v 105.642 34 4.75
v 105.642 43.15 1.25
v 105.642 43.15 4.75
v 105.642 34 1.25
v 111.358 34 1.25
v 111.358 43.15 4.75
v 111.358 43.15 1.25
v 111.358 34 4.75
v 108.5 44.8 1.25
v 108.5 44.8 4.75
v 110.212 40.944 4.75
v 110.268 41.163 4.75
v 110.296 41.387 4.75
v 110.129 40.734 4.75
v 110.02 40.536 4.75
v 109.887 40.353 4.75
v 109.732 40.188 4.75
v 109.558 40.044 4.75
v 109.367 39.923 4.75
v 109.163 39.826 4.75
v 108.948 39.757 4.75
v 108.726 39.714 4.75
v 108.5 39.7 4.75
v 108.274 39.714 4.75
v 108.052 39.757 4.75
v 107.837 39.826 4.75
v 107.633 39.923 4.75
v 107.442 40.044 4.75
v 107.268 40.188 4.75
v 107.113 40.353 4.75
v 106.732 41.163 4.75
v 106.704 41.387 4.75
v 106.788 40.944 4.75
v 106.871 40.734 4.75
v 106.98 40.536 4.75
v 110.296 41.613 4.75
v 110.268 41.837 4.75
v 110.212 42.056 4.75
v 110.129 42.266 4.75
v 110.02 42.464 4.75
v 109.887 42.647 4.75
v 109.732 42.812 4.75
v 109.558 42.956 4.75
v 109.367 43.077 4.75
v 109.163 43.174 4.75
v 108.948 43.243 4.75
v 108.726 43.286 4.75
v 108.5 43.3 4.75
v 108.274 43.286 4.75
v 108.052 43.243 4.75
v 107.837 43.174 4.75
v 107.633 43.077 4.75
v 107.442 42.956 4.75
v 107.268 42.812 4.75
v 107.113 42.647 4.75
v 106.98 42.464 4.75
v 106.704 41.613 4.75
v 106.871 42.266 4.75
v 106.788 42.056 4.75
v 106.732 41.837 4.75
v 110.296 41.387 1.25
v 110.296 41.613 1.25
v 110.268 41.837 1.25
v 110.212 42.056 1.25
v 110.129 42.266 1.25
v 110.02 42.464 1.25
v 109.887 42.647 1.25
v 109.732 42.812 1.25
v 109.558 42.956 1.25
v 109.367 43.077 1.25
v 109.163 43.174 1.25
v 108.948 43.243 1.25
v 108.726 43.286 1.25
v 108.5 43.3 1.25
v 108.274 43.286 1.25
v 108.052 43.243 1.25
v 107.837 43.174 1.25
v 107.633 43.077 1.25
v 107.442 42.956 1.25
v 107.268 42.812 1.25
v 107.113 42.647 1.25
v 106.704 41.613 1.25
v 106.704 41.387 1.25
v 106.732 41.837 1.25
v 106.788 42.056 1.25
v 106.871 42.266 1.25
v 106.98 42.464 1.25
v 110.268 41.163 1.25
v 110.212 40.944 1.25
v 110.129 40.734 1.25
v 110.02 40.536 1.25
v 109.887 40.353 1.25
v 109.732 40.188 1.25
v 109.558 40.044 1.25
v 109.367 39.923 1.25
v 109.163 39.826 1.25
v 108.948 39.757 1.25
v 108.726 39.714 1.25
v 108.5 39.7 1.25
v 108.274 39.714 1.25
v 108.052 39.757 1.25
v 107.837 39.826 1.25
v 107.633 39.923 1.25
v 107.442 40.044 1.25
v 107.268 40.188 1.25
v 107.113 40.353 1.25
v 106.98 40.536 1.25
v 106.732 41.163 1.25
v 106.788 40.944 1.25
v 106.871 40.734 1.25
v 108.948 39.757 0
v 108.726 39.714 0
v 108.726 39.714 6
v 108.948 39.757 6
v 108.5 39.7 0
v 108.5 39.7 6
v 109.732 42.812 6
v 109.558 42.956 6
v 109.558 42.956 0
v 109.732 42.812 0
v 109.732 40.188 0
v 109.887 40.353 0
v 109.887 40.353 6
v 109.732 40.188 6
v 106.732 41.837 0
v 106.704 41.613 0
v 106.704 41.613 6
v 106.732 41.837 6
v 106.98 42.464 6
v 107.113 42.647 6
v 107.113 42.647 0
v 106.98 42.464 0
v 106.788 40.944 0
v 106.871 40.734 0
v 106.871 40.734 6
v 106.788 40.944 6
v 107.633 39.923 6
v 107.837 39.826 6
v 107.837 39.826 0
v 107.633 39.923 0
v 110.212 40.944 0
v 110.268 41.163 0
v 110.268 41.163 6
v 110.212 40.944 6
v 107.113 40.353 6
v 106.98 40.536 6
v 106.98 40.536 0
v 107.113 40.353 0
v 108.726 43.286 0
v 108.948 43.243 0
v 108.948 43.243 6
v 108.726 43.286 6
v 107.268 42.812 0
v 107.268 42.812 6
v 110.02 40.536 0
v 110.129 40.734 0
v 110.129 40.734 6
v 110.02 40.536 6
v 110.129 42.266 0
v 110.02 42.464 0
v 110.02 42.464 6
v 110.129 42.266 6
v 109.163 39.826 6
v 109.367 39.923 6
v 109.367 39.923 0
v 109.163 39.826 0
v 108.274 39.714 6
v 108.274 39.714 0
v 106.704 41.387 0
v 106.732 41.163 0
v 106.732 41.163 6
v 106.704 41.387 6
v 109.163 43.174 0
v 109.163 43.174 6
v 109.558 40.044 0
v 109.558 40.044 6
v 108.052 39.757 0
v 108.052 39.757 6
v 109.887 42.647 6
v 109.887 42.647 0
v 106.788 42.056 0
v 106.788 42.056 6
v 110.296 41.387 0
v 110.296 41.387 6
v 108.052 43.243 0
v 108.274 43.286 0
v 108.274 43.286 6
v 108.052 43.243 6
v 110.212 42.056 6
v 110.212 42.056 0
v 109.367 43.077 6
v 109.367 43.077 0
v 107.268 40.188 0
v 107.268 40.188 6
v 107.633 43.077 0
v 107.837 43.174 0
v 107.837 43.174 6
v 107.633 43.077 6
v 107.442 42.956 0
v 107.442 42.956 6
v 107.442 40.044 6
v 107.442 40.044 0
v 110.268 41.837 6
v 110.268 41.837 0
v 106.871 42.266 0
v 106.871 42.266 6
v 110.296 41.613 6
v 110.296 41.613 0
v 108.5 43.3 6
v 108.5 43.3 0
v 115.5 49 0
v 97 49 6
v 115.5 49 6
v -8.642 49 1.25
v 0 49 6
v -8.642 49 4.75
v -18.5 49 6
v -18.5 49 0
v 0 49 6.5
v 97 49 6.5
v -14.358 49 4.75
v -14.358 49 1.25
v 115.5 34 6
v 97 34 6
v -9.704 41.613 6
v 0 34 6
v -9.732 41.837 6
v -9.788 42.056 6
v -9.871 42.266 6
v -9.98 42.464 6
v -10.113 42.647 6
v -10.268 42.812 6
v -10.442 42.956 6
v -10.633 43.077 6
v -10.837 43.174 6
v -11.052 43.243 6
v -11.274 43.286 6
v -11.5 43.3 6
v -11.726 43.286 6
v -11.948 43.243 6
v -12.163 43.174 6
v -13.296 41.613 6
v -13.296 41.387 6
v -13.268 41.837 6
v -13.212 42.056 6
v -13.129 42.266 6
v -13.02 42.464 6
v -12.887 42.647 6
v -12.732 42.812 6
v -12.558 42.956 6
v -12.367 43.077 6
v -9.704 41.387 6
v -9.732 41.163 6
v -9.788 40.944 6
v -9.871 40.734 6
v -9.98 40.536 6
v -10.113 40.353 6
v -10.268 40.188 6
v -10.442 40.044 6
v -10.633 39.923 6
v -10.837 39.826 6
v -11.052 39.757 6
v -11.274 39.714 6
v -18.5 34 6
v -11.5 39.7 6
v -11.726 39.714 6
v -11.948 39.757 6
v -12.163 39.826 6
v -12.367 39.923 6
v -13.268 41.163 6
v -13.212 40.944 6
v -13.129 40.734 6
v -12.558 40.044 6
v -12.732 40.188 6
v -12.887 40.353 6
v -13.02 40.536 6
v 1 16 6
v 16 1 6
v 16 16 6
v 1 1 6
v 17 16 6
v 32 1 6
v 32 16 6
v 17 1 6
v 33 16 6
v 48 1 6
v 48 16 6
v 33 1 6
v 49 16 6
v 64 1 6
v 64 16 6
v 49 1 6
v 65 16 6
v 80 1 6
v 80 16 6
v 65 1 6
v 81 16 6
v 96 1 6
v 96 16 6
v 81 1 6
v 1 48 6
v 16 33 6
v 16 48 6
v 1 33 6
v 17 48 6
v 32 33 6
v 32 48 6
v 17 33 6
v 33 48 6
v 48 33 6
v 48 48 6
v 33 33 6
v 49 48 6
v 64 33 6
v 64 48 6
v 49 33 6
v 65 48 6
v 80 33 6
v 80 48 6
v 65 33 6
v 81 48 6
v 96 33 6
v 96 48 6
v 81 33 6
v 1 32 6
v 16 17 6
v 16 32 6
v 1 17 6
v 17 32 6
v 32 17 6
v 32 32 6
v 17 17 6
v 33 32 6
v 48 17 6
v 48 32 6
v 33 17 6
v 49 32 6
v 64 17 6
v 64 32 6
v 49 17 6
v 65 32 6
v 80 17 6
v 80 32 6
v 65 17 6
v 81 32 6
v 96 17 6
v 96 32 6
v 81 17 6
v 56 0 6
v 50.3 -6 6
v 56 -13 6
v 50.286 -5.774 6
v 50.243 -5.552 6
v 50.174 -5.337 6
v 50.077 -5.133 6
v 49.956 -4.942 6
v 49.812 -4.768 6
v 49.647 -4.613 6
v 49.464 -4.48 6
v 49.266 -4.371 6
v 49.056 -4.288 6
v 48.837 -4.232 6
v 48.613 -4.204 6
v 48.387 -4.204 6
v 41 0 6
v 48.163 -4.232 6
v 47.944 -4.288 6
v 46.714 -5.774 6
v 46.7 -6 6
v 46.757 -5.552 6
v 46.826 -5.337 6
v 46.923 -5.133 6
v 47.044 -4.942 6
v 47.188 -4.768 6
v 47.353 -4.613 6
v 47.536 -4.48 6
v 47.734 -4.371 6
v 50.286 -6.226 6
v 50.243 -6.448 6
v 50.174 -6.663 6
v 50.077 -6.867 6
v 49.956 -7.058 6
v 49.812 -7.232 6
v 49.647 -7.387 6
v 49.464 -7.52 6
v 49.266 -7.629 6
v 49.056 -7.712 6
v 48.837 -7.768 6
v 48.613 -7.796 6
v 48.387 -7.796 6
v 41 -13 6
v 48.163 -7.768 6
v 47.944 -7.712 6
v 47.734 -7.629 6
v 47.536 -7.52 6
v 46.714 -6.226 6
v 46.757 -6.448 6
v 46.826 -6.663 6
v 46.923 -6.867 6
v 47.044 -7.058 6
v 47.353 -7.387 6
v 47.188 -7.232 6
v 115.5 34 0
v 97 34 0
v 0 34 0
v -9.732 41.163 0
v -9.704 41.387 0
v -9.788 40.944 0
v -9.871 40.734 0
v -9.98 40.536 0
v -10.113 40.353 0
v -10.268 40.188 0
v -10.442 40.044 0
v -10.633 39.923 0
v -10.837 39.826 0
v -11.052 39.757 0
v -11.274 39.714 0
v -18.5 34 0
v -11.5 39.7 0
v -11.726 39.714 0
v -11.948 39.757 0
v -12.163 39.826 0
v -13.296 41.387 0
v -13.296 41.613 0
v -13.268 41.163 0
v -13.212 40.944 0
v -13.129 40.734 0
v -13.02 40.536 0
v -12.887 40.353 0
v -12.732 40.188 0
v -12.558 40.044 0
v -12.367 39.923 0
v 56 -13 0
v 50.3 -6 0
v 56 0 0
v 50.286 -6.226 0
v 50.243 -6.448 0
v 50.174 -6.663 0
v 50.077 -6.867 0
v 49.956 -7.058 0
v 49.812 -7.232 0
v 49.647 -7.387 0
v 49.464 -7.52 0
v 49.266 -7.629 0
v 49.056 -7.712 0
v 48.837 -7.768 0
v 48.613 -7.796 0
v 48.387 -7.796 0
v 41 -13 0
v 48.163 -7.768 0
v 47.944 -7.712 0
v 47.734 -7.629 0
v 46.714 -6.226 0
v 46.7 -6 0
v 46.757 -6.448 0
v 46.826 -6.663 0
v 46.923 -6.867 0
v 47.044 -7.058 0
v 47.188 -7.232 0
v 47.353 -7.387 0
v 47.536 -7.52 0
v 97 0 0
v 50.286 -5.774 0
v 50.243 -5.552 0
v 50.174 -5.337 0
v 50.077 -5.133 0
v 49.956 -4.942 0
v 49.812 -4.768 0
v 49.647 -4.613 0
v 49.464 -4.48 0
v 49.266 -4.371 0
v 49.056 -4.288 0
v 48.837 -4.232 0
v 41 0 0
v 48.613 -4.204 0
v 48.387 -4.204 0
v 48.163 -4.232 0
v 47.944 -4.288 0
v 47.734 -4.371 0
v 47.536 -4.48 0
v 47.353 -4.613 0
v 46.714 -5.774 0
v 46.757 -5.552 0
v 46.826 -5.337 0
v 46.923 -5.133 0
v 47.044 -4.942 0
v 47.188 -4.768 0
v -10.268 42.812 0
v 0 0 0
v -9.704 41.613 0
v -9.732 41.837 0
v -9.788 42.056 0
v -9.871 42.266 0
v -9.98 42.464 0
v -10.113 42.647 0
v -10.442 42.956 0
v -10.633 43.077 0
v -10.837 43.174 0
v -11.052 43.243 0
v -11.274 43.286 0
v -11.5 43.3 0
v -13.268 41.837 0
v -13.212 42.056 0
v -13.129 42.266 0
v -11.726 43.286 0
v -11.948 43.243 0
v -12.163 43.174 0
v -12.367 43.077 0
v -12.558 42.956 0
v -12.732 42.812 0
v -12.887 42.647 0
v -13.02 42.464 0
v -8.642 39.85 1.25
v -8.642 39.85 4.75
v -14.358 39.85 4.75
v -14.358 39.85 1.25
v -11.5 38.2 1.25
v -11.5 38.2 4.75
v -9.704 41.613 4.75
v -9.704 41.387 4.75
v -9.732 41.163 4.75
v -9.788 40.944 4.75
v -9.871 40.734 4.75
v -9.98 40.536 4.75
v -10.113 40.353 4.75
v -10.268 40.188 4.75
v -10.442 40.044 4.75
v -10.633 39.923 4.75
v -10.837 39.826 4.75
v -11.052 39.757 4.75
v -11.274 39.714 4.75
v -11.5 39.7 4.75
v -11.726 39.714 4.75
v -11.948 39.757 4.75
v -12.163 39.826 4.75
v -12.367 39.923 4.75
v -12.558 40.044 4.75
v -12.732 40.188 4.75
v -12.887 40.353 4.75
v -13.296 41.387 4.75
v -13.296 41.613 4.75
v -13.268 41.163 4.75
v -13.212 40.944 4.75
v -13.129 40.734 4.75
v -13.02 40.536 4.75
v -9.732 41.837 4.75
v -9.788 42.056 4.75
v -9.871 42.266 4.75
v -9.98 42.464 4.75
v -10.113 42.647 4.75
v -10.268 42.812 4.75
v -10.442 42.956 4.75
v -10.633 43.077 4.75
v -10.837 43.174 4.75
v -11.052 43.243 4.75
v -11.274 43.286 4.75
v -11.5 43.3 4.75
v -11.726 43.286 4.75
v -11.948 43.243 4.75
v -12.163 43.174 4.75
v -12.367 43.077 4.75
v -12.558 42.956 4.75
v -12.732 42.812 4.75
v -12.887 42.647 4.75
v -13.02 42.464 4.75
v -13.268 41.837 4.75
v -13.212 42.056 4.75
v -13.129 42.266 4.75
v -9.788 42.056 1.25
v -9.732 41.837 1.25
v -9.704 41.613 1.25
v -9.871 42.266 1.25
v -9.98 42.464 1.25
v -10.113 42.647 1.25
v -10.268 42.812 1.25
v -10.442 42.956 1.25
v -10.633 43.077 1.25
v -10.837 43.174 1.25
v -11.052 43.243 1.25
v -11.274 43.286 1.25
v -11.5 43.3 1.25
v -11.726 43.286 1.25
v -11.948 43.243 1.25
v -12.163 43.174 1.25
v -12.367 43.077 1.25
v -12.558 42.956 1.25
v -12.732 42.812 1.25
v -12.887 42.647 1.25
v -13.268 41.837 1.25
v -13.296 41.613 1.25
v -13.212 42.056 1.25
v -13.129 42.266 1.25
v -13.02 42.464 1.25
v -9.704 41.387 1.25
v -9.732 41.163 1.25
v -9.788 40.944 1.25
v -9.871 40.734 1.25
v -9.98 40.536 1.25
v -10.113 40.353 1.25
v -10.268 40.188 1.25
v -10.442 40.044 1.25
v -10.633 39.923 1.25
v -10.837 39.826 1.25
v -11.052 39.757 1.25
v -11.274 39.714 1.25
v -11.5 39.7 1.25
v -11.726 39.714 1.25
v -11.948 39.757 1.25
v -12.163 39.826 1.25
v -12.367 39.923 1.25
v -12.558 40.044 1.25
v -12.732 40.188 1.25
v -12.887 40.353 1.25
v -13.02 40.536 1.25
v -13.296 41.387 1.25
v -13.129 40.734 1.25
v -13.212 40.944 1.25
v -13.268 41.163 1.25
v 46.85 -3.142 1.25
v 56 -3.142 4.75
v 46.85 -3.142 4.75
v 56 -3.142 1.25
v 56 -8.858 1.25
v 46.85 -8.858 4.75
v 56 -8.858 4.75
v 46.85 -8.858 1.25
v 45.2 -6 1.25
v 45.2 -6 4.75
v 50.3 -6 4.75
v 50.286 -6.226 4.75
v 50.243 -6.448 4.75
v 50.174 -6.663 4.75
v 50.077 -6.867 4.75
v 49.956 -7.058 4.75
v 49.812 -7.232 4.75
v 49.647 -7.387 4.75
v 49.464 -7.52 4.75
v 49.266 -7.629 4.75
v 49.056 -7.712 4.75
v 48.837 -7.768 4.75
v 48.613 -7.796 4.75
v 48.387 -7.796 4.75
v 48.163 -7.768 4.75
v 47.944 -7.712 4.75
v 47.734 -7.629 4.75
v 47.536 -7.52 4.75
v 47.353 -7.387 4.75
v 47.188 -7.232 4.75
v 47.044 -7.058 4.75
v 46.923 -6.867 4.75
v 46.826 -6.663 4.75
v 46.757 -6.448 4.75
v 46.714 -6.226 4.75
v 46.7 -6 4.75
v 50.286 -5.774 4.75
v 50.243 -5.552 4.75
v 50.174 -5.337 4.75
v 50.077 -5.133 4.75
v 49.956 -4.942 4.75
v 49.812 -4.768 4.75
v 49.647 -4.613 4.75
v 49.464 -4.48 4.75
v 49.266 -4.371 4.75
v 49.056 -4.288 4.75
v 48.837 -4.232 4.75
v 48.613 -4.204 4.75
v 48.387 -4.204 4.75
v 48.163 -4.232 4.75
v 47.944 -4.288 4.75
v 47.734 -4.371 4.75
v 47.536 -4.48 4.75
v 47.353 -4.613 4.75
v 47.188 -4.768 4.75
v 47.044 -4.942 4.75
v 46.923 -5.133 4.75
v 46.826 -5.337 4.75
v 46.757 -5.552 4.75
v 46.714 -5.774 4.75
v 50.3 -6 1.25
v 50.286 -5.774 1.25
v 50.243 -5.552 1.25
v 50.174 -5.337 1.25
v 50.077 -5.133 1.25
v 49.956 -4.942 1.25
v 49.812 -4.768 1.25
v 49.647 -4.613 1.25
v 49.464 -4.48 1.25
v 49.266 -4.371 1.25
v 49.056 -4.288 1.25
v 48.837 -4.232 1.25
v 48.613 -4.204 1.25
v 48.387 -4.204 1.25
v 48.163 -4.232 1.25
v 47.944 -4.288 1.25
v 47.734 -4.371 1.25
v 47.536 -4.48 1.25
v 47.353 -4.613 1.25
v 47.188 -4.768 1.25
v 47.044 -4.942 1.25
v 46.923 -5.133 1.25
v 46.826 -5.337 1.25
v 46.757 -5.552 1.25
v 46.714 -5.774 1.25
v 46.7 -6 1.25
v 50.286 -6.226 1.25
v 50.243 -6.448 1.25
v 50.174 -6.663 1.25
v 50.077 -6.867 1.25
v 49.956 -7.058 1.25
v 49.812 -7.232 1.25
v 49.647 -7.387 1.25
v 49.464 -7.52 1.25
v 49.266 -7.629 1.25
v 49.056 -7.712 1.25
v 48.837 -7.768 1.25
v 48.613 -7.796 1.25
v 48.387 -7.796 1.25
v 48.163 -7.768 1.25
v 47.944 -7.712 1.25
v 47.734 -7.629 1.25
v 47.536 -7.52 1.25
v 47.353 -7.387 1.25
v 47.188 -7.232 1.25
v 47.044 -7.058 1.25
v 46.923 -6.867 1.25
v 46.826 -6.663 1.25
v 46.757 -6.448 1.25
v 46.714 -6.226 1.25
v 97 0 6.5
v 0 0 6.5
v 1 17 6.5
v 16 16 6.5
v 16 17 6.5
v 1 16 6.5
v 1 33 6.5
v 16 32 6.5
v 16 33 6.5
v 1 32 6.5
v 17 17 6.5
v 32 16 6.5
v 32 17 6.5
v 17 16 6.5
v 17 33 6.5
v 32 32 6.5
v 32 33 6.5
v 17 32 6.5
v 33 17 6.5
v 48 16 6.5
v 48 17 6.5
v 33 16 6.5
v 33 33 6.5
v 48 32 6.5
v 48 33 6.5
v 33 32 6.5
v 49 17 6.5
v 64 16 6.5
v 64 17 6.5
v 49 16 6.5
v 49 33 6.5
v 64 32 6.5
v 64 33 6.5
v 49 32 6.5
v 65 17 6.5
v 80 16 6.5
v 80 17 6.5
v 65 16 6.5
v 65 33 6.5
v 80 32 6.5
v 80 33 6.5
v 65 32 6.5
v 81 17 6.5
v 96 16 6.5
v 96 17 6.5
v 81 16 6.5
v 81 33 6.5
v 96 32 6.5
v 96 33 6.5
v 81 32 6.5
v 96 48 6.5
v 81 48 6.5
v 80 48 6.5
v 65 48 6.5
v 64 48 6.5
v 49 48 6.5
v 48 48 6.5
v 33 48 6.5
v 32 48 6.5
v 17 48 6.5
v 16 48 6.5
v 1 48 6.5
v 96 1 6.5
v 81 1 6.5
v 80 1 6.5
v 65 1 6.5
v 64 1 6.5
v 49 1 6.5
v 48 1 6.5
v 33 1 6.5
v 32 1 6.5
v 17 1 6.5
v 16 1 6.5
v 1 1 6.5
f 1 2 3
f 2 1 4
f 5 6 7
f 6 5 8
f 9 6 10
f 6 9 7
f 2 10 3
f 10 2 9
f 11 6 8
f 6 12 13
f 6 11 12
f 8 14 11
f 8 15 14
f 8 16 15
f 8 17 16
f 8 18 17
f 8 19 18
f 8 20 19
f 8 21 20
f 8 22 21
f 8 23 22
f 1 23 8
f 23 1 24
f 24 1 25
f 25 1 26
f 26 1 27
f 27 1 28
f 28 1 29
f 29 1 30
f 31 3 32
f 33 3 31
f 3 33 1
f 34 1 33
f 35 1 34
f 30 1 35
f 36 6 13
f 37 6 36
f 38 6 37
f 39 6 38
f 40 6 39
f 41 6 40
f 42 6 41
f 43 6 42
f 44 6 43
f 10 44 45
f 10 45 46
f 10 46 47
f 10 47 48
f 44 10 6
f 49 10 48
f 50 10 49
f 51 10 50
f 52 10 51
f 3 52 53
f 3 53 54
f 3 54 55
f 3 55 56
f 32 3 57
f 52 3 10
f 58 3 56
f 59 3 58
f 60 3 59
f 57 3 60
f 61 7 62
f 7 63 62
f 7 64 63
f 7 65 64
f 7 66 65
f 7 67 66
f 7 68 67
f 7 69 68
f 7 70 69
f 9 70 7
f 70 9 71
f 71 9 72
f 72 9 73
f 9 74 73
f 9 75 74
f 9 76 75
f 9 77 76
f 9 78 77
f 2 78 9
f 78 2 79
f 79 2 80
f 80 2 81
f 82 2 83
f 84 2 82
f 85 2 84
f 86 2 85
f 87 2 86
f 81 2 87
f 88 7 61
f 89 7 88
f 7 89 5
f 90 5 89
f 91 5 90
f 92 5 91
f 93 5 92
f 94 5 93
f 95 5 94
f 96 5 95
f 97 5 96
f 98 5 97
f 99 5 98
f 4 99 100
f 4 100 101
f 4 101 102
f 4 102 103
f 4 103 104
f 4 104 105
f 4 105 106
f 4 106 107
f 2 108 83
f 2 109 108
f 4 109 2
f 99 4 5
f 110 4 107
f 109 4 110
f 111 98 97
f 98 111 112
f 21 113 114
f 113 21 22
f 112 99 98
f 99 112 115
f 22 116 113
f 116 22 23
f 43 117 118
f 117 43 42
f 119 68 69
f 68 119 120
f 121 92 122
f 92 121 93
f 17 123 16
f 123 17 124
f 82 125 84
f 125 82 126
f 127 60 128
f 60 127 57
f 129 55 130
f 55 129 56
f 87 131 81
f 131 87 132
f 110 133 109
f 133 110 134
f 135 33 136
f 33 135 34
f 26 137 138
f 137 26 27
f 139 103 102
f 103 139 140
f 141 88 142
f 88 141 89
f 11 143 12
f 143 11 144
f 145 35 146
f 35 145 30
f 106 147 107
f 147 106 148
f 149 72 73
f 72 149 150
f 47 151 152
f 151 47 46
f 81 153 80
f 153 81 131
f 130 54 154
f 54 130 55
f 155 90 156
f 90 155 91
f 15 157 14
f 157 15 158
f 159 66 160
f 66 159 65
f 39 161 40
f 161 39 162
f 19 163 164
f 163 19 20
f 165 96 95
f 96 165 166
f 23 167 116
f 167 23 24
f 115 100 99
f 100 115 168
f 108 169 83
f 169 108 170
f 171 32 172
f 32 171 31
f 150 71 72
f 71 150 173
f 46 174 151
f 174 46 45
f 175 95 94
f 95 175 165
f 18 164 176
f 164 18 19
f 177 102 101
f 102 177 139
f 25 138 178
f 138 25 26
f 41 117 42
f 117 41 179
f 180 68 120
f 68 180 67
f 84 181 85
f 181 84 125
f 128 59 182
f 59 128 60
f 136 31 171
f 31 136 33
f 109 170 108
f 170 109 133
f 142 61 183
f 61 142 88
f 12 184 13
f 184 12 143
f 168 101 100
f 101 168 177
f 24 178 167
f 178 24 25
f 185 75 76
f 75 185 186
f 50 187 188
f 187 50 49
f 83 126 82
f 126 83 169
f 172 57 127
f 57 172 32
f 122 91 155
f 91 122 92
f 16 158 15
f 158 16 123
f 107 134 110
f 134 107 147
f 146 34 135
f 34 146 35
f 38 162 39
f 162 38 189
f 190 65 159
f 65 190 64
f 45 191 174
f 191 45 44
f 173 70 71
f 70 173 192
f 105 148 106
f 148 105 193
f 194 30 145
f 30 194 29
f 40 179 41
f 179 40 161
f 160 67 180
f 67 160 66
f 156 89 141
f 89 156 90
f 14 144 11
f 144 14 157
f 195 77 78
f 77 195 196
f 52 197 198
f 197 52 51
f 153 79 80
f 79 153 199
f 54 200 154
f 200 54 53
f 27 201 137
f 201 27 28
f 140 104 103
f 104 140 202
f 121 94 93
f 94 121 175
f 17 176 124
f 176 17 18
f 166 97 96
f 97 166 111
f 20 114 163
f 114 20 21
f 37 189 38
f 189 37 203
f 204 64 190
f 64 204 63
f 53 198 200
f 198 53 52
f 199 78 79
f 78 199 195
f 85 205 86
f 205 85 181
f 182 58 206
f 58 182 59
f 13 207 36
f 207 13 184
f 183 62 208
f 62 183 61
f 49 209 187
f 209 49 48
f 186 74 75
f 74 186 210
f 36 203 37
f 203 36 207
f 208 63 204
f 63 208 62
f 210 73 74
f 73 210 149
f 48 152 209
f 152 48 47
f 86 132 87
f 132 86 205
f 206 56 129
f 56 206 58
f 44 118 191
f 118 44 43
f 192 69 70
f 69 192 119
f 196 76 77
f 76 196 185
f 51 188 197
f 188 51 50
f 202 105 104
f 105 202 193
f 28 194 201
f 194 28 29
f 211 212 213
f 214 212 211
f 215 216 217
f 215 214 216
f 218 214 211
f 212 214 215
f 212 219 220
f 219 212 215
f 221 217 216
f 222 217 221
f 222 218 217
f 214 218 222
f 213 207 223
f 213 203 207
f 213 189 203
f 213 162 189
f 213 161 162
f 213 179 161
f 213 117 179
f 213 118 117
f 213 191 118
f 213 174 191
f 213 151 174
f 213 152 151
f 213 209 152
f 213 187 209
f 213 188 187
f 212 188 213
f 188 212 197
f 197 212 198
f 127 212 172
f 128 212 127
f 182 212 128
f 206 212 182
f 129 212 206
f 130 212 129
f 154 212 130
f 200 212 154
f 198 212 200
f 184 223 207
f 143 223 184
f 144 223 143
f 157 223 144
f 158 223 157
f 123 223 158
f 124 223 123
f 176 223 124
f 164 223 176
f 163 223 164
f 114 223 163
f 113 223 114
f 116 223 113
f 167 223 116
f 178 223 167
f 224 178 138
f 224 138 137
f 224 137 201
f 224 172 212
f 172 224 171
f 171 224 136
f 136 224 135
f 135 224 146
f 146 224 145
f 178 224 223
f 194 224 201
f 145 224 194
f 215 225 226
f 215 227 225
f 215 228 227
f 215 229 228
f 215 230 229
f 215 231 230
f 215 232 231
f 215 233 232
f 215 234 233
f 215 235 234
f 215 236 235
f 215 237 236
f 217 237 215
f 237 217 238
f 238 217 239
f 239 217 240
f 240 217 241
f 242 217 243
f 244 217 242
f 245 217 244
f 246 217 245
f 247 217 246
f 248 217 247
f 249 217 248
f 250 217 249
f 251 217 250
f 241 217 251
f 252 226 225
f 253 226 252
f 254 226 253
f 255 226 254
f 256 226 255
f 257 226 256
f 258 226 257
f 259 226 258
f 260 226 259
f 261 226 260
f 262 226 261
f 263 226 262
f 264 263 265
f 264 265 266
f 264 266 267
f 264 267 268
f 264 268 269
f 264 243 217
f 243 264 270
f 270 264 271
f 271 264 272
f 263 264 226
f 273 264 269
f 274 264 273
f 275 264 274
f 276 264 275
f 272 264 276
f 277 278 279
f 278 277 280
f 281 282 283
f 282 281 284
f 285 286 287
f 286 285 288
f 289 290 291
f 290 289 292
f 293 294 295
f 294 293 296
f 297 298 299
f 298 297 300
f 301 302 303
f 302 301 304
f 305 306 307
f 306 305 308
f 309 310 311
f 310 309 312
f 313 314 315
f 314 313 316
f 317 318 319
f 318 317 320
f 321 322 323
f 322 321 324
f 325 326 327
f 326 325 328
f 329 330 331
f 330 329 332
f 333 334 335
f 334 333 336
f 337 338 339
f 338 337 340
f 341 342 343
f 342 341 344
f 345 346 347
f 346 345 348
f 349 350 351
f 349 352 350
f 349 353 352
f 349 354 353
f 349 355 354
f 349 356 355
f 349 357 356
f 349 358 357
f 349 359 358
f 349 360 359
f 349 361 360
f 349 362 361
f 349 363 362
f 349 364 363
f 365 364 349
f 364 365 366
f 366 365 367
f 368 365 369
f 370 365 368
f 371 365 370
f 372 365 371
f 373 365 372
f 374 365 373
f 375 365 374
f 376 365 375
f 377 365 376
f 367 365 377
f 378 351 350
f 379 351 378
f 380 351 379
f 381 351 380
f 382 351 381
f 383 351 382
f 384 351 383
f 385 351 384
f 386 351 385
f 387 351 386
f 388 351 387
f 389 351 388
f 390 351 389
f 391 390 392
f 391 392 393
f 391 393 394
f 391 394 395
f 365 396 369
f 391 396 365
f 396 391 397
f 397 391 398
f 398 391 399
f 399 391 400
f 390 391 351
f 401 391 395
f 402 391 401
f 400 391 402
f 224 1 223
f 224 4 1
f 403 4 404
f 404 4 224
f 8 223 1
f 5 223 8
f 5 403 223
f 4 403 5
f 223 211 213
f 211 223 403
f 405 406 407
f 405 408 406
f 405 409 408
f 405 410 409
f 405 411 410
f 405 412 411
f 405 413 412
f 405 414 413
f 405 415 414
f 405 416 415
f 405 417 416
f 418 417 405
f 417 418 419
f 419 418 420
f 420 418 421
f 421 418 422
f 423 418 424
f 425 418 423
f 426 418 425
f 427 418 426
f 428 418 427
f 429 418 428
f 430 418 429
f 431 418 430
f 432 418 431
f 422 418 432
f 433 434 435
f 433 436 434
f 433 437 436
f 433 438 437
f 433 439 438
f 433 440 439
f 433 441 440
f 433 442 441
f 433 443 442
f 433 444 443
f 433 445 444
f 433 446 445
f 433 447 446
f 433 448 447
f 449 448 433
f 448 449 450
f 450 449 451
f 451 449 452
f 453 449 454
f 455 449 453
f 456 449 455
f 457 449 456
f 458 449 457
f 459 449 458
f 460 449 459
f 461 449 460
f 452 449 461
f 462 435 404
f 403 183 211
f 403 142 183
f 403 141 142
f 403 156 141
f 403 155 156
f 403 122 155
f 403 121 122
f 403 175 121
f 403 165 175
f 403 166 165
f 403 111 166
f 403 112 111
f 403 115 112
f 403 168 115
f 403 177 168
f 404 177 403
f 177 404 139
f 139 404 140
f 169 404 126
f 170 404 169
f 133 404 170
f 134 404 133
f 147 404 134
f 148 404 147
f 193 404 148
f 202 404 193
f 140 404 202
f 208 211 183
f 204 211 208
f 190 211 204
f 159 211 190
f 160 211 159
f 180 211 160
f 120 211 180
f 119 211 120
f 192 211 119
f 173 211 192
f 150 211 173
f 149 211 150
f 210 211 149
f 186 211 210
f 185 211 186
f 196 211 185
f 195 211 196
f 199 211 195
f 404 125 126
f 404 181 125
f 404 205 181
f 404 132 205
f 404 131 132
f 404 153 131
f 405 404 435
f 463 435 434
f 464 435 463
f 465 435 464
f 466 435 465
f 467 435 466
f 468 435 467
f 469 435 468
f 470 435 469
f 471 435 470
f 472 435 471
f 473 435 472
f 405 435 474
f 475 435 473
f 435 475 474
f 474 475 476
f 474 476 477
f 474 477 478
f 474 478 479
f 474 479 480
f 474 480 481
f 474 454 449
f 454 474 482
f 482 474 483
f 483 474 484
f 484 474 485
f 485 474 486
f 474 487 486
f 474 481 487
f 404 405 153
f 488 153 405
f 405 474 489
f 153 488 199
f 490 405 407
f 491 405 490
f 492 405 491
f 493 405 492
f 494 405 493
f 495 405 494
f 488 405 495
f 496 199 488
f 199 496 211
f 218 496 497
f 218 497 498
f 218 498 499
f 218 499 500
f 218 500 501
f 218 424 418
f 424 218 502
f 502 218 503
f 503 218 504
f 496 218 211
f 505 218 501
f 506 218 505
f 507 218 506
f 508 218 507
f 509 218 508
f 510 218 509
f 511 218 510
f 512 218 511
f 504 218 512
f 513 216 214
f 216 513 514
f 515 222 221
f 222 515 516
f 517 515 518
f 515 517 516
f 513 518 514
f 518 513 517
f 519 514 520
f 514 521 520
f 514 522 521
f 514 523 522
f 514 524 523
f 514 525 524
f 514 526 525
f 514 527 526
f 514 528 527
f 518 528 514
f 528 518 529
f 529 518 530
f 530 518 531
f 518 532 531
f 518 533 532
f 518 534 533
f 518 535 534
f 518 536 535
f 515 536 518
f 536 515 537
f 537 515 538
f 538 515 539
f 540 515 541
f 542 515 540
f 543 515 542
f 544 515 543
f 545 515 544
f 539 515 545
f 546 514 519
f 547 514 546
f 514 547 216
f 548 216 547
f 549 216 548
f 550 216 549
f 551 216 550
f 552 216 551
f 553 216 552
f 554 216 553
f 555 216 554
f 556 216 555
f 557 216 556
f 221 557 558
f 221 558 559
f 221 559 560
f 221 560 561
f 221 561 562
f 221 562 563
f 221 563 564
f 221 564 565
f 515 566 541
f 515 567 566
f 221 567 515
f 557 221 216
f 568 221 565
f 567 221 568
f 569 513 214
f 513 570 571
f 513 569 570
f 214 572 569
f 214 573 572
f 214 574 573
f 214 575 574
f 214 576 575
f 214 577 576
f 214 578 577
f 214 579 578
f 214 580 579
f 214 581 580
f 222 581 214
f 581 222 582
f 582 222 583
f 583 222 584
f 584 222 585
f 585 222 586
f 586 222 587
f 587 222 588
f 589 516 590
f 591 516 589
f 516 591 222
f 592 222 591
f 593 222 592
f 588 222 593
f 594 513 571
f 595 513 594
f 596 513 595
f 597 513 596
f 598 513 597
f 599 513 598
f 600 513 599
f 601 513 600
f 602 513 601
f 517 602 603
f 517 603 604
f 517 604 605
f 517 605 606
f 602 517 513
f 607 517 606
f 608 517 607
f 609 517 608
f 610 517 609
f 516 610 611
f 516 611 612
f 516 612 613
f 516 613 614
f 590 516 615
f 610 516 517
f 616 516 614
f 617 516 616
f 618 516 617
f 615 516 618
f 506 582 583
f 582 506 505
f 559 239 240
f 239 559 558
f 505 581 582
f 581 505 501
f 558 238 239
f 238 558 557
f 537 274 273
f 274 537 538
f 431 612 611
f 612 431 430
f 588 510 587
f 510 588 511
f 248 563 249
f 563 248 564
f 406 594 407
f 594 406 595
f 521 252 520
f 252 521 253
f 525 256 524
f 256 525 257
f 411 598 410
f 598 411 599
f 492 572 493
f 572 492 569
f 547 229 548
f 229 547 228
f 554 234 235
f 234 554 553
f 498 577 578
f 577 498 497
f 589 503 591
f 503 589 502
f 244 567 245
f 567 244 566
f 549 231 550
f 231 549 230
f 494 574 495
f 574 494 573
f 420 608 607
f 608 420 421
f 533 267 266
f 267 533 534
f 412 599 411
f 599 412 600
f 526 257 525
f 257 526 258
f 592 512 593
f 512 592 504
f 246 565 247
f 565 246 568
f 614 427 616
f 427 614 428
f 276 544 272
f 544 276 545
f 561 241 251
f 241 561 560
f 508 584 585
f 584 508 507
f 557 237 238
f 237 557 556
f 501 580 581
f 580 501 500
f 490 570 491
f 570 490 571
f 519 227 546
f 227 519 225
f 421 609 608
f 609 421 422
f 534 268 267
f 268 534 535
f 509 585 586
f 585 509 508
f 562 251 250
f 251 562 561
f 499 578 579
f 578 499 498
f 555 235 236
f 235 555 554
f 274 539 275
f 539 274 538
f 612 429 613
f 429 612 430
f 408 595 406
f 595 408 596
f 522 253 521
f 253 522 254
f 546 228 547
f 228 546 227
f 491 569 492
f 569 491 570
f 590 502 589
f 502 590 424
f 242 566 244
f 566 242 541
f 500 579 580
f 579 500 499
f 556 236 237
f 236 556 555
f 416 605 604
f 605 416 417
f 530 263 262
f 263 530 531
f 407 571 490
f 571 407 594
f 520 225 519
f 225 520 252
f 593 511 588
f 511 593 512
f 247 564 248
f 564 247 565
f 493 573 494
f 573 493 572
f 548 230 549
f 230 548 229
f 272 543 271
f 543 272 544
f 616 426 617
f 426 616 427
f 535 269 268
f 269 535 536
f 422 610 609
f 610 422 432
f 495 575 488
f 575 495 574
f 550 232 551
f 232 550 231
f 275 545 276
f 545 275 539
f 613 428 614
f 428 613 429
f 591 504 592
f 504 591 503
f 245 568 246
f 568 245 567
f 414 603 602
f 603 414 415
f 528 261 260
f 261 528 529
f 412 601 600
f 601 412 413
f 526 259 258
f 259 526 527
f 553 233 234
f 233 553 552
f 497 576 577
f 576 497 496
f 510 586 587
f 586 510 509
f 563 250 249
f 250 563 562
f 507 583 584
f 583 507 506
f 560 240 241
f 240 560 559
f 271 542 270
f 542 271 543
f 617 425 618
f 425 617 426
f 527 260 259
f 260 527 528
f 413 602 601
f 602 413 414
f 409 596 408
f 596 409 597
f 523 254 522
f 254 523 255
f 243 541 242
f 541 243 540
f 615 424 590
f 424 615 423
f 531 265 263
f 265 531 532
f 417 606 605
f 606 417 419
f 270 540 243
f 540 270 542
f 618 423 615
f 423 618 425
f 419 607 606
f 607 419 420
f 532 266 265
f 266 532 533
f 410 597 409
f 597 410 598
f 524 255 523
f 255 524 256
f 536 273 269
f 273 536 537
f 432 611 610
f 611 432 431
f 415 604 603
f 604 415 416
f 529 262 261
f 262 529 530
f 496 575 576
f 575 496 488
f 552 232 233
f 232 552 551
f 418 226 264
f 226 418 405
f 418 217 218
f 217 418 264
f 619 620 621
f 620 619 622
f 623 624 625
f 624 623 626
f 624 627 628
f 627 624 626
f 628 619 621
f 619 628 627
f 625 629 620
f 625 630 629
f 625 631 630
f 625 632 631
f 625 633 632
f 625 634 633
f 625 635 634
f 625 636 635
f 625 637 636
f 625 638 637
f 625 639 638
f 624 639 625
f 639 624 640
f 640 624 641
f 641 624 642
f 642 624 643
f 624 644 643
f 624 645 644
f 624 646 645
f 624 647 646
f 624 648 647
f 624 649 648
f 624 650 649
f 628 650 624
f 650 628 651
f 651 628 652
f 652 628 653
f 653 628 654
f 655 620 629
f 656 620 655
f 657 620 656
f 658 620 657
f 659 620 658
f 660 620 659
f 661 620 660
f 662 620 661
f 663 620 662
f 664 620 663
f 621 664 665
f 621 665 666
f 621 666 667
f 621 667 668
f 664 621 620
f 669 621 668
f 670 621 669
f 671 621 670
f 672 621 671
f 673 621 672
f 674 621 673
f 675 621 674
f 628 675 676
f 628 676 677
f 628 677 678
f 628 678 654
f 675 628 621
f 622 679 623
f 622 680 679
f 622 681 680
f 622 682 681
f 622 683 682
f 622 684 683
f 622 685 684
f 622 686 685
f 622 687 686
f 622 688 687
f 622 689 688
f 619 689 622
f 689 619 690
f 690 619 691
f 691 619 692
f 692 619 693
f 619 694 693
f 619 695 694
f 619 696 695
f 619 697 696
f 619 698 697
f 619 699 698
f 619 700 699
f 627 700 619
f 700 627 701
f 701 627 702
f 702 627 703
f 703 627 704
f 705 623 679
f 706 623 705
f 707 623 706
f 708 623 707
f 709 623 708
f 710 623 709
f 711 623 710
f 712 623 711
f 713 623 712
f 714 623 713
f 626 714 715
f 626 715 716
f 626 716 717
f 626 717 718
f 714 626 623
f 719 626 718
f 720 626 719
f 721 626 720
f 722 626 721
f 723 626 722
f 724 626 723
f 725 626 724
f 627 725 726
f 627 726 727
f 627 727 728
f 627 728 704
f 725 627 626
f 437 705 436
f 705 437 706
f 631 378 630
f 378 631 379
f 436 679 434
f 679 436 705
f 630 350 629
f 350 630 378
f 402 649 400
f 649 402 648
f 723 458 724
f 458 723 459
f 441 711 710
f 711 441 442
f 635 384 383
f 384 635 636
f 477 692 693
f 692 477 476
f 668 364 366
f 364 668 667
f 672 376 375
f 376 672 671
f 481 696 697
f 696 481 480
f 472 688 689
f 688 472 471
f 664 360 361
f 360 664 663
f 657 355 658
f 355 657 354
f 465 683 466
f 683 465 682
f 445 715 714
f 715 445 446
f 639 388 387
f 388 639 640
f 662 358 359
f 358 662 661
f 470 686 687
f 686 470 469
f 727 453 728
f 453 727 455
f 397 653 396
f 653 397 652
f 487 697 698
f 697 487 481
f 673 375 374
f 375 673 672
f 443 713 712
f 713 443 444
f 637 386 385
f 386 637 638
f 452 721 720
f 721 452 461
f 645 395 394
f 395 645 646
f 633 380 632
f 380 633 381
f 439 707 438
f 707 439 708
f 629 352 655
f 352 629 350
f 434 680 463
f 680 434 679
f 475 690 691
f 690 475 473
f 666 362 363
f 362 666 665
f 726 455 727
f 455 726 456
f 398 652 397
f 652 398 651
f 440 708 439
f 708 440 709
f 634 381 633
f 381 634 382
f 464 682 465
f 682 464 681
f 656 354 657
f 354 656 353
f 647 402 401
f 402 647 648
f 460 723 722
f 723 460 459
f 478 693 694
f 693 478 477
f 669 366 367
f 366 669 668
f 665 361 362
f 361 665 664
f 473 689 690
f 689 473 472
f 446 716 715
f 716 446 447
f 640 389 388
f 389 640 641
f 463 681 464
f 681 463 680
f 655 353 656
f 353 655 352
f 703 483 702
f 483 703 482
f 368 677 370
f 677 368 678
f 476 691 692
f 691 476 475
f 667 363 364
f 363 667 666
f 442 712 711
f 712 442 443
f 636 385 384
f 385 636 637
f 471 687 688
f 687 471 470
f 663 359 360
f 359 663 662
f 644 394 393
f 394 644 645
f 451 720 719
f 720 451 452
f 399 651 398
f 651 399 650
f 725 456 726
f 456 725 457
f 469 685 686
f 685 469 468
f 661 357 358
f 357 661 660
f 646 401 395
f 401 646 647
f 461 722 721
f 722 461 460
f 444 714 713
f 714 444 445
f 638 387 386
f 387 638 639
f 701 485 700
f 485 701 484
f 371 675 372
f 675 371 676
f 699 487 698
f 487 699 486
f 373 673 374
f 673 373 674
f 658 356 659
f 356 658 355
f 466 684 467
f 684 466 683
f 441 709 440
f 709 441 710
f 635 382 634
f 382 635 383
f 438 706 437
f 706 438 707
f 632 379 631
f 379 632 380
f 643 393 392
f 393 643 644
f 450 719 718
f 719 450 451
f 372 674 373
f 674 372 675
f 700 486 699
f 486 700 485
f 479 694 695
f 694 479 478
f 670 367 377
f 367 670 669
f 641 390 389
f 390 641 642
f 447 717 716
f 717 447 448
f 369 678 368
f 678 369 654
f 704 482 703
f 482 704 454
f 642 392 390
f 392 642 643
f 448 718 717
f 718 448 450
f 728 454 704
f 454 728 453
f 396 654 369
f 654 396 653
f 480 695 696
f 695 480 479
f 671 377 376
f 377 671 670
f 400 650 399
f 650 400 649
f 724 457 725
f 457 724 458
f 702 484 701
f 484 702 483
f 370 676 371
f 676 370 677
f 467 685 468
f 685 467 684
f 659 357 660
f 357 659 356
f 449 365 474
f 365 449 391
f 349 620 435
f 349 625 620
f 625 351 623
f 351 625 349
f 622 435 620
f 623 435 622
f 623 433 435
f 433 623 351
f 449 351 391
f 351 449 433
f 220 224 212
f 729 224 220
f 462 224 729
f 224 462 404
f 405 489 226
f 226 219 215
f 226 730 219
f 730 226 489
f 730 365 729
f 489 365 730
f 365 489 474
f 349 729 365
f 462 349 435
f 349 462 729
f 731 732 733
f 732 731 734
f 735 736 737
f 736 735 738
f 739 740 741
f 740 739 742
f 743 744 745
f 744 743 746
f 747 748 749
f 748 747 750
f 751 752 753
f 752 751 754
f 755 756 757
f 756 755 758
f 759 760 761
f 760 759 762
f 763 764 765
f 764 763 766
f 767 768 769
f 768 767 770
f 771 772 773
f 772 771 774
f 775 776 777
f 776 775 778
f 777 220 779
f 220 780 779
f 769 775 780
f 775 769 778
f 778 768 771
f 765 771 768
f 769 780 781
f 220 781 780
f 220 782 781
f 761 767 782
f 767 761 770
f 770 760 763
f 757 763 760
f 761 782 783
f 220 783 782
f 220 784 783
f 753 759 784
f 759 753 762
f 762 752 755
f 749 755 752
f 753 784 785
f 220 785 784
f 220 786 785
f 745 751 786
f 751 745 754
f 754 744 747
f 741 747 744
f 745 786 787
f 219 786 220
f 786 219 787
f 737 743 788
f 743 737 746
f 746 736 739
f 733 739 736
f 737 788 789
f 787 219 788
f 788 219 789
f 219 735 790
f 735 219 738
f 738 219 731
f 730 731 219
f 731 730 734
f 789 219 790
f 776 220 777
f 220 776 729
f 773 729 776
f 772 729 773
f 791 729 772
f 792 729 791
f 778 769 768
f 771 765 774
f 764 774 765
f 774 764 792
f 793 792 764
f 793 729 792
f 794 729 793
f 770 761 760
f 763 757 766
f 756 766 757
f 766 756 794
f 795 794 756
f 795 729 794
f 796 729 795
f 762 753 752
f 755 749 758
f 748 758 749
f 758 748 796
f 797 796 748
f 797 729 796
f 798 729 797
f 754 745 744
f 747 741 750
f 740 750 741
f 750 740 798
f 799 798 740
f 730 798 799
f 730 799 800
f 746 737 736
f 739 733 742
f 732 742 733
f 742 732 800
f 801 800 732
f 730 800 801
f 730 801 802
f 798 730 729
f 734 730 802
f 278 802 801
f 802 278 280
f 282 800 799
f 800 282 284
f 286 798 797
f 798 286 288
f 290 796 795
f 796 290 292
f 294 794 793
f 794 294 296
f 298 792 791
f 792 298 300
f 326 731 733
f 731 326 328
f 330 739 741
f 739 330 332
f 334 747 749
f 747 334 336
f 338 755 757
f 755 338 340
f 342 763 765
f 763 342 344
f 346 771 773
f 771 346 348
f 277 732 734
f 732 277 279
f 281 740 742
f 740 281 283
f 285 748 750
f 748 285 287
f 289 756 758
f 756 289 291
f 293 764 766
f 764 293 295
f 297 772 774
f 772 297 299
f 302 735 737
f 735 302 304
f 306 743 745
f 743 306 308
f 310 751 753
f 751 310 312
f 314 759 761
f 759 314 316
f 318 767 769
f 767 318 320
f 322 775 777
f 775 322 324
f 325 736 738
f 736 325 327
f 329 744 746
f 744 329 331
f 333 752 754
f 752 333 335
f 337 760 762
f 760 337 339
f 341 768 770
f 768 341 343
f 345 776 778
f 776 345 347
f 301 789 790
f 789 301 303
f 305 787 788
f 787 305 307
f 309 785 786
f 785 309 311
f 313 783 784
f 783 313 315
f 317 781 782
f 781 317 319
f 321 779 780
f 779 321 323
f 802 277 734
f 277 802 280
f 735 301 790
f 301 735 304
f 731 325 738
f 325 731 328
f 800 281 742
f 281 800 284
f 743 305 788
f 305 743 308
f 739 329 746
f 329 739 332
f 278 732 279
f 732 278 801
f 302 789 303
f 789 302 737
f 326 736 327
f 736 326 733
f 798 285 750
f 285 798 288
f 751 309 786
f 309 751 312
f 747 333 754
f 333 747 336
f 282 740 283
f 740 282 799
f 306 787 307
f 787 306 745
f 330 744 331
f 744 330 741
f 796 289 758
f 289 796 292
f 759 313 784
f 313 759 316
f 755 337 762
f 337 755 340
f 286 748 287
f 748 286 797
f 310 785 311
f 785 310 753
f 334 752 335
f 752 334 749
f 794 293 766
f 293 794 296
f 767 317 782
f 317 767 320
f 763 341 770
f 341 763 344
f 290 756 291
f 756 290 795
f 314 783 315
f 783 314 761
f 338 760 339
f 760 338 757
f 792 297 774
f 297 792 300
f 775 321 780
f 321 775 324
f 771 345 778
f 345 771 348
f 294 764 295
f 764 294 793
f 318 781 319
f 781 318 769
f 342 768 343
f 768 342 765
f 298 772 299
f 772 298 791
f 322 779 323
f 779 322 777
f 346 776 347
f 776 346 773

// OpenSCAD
/********************************************************
This file is part of the RepRapPNP project, developed at the University of Hamburg.
Author: Florens Wasserfall <wasserfall@kalanka.de> 
License: 'GNU Affero General Public License AGPLv3 http://www.gnu.org/licenses/agpl.html' 
*******************************************************/

// general object resolution
$fn = 50;

// configuration variables
tray_height = 6; //hight of the base without rim
notch_dist = 60.0; //for ground clamps. A high notch dist moves clamps to the side of the tray
rim_height = 0.5;
rim_width = 1.0;
box_size = 15;
rows = 3;
cols = 6;

size_x = box_size*cols+rim_width*cols+rim_width;
size_y = box_size*rows+rim_width*rows+rim_width;

// render trary
base(simple_clamps=true);
translate([0, 0, tray_height]) rim();

//slicing_box();

//base plate
module base(clamps = false, simple_clamps = false) {
	union() {
		cube(size=[size_x, size_y, tray_height], center=false);
        if(clamps || simple_clamps) {
        	if(2*notch_dist-6 > size_x) {
        		//move clamps to the side
        		translate([size_x/2+notch_dist, size_y-15/2, 0]) rotate([0, 0, -90]) clamp(15, ground_fix = clamps);
            	translate([size_x/2-notch_dist, size_y-15/2, 0]) rotate([0, 0, 90]) clamp(15, ground_fix = clamps);
        	}else{
        		//clamps at opposite ends
            	translate([size_x/2+notch_dist, size_y+6, 0]) clamp(15, ground_fix = clamps);
            	translate([size_x/2-notch_dist, size_y+6, 0]) clamp(15, ground_fix = clamps);
        	}
            translate([size_x/2, -6, 0]) mirror([0, 1, 0]) clamp(15, ground_fix = clamps);
        }
	}
}


module rim() {
	color("Blue") {
		union() {
			for(i=[0:rows]) {
				translate([0, i*box_size+i*rim_width, 0]) cube(size=[size_x, rim_width, rim_height], center=false);
			}
			for(i=[0:cols]) {
				translate([i*box_size+i*rim_width, 0, 0]) cube(size=[rim_width, size_y, rim_height], center=false);
			}
		}
	}
}


module clamp(width, ground_fix = false) {
	wall_dia = 6;
	height = tray_height;
	translate([0, -6, 0]) {
		difference() {
			union() {
				hull() {
					translate([0, -2, height/2]) cube(size=[width, 30, height], center=true);	
					if(ground_fix) {
						translate([0, 28, 2.5]) cube(size=[width, 12, 5], center=true);
					}
				}
				if(ground_fix) {
					translate([0, 40, 2.5]) difference() {
						cube(size=[width, 14, 5], center=true);
						cylinder(r=3.2, h=20, center=true);
					}
				}
			}

			//screw
			translate([0, 6, 0]) {
				//M4
				/*
				cylinder(r=2.3, h=40, center=true);
				//#translate([0, 0, tray_height]) cylinder(r=4.2, h=15, center=false);
				translate([0, 0, height/2]) {
					for(i=[0:3]) {
						translate([i*4.0, 0, 0]) cylinder(r=4.3, h=3.3, center=true, $fn=6);
					}
				}
				*/
				//M3
				
				cylinder(r=1.8, h=40, center=true);
				//#translate([0, 0, tray_height]) cylinder(r=4.2, h=15, center=false);
				translate([0, 0, height/2]) {
					for(i=[0:3]) {
						translate([i*3.0, 0, 0]) cylinder(r=3.3, h=3.5, $fn=6, center=true);
					}
				}
			}
		}
	}
}


// this can be used to generate a box to be printed by the second (brim) extruder to prevent clogging of the nozzle.
module slicing_box() {
	translate([0, 0, tray_height/2]) cube(size=[20, 20, tray_height], center=true);
}
